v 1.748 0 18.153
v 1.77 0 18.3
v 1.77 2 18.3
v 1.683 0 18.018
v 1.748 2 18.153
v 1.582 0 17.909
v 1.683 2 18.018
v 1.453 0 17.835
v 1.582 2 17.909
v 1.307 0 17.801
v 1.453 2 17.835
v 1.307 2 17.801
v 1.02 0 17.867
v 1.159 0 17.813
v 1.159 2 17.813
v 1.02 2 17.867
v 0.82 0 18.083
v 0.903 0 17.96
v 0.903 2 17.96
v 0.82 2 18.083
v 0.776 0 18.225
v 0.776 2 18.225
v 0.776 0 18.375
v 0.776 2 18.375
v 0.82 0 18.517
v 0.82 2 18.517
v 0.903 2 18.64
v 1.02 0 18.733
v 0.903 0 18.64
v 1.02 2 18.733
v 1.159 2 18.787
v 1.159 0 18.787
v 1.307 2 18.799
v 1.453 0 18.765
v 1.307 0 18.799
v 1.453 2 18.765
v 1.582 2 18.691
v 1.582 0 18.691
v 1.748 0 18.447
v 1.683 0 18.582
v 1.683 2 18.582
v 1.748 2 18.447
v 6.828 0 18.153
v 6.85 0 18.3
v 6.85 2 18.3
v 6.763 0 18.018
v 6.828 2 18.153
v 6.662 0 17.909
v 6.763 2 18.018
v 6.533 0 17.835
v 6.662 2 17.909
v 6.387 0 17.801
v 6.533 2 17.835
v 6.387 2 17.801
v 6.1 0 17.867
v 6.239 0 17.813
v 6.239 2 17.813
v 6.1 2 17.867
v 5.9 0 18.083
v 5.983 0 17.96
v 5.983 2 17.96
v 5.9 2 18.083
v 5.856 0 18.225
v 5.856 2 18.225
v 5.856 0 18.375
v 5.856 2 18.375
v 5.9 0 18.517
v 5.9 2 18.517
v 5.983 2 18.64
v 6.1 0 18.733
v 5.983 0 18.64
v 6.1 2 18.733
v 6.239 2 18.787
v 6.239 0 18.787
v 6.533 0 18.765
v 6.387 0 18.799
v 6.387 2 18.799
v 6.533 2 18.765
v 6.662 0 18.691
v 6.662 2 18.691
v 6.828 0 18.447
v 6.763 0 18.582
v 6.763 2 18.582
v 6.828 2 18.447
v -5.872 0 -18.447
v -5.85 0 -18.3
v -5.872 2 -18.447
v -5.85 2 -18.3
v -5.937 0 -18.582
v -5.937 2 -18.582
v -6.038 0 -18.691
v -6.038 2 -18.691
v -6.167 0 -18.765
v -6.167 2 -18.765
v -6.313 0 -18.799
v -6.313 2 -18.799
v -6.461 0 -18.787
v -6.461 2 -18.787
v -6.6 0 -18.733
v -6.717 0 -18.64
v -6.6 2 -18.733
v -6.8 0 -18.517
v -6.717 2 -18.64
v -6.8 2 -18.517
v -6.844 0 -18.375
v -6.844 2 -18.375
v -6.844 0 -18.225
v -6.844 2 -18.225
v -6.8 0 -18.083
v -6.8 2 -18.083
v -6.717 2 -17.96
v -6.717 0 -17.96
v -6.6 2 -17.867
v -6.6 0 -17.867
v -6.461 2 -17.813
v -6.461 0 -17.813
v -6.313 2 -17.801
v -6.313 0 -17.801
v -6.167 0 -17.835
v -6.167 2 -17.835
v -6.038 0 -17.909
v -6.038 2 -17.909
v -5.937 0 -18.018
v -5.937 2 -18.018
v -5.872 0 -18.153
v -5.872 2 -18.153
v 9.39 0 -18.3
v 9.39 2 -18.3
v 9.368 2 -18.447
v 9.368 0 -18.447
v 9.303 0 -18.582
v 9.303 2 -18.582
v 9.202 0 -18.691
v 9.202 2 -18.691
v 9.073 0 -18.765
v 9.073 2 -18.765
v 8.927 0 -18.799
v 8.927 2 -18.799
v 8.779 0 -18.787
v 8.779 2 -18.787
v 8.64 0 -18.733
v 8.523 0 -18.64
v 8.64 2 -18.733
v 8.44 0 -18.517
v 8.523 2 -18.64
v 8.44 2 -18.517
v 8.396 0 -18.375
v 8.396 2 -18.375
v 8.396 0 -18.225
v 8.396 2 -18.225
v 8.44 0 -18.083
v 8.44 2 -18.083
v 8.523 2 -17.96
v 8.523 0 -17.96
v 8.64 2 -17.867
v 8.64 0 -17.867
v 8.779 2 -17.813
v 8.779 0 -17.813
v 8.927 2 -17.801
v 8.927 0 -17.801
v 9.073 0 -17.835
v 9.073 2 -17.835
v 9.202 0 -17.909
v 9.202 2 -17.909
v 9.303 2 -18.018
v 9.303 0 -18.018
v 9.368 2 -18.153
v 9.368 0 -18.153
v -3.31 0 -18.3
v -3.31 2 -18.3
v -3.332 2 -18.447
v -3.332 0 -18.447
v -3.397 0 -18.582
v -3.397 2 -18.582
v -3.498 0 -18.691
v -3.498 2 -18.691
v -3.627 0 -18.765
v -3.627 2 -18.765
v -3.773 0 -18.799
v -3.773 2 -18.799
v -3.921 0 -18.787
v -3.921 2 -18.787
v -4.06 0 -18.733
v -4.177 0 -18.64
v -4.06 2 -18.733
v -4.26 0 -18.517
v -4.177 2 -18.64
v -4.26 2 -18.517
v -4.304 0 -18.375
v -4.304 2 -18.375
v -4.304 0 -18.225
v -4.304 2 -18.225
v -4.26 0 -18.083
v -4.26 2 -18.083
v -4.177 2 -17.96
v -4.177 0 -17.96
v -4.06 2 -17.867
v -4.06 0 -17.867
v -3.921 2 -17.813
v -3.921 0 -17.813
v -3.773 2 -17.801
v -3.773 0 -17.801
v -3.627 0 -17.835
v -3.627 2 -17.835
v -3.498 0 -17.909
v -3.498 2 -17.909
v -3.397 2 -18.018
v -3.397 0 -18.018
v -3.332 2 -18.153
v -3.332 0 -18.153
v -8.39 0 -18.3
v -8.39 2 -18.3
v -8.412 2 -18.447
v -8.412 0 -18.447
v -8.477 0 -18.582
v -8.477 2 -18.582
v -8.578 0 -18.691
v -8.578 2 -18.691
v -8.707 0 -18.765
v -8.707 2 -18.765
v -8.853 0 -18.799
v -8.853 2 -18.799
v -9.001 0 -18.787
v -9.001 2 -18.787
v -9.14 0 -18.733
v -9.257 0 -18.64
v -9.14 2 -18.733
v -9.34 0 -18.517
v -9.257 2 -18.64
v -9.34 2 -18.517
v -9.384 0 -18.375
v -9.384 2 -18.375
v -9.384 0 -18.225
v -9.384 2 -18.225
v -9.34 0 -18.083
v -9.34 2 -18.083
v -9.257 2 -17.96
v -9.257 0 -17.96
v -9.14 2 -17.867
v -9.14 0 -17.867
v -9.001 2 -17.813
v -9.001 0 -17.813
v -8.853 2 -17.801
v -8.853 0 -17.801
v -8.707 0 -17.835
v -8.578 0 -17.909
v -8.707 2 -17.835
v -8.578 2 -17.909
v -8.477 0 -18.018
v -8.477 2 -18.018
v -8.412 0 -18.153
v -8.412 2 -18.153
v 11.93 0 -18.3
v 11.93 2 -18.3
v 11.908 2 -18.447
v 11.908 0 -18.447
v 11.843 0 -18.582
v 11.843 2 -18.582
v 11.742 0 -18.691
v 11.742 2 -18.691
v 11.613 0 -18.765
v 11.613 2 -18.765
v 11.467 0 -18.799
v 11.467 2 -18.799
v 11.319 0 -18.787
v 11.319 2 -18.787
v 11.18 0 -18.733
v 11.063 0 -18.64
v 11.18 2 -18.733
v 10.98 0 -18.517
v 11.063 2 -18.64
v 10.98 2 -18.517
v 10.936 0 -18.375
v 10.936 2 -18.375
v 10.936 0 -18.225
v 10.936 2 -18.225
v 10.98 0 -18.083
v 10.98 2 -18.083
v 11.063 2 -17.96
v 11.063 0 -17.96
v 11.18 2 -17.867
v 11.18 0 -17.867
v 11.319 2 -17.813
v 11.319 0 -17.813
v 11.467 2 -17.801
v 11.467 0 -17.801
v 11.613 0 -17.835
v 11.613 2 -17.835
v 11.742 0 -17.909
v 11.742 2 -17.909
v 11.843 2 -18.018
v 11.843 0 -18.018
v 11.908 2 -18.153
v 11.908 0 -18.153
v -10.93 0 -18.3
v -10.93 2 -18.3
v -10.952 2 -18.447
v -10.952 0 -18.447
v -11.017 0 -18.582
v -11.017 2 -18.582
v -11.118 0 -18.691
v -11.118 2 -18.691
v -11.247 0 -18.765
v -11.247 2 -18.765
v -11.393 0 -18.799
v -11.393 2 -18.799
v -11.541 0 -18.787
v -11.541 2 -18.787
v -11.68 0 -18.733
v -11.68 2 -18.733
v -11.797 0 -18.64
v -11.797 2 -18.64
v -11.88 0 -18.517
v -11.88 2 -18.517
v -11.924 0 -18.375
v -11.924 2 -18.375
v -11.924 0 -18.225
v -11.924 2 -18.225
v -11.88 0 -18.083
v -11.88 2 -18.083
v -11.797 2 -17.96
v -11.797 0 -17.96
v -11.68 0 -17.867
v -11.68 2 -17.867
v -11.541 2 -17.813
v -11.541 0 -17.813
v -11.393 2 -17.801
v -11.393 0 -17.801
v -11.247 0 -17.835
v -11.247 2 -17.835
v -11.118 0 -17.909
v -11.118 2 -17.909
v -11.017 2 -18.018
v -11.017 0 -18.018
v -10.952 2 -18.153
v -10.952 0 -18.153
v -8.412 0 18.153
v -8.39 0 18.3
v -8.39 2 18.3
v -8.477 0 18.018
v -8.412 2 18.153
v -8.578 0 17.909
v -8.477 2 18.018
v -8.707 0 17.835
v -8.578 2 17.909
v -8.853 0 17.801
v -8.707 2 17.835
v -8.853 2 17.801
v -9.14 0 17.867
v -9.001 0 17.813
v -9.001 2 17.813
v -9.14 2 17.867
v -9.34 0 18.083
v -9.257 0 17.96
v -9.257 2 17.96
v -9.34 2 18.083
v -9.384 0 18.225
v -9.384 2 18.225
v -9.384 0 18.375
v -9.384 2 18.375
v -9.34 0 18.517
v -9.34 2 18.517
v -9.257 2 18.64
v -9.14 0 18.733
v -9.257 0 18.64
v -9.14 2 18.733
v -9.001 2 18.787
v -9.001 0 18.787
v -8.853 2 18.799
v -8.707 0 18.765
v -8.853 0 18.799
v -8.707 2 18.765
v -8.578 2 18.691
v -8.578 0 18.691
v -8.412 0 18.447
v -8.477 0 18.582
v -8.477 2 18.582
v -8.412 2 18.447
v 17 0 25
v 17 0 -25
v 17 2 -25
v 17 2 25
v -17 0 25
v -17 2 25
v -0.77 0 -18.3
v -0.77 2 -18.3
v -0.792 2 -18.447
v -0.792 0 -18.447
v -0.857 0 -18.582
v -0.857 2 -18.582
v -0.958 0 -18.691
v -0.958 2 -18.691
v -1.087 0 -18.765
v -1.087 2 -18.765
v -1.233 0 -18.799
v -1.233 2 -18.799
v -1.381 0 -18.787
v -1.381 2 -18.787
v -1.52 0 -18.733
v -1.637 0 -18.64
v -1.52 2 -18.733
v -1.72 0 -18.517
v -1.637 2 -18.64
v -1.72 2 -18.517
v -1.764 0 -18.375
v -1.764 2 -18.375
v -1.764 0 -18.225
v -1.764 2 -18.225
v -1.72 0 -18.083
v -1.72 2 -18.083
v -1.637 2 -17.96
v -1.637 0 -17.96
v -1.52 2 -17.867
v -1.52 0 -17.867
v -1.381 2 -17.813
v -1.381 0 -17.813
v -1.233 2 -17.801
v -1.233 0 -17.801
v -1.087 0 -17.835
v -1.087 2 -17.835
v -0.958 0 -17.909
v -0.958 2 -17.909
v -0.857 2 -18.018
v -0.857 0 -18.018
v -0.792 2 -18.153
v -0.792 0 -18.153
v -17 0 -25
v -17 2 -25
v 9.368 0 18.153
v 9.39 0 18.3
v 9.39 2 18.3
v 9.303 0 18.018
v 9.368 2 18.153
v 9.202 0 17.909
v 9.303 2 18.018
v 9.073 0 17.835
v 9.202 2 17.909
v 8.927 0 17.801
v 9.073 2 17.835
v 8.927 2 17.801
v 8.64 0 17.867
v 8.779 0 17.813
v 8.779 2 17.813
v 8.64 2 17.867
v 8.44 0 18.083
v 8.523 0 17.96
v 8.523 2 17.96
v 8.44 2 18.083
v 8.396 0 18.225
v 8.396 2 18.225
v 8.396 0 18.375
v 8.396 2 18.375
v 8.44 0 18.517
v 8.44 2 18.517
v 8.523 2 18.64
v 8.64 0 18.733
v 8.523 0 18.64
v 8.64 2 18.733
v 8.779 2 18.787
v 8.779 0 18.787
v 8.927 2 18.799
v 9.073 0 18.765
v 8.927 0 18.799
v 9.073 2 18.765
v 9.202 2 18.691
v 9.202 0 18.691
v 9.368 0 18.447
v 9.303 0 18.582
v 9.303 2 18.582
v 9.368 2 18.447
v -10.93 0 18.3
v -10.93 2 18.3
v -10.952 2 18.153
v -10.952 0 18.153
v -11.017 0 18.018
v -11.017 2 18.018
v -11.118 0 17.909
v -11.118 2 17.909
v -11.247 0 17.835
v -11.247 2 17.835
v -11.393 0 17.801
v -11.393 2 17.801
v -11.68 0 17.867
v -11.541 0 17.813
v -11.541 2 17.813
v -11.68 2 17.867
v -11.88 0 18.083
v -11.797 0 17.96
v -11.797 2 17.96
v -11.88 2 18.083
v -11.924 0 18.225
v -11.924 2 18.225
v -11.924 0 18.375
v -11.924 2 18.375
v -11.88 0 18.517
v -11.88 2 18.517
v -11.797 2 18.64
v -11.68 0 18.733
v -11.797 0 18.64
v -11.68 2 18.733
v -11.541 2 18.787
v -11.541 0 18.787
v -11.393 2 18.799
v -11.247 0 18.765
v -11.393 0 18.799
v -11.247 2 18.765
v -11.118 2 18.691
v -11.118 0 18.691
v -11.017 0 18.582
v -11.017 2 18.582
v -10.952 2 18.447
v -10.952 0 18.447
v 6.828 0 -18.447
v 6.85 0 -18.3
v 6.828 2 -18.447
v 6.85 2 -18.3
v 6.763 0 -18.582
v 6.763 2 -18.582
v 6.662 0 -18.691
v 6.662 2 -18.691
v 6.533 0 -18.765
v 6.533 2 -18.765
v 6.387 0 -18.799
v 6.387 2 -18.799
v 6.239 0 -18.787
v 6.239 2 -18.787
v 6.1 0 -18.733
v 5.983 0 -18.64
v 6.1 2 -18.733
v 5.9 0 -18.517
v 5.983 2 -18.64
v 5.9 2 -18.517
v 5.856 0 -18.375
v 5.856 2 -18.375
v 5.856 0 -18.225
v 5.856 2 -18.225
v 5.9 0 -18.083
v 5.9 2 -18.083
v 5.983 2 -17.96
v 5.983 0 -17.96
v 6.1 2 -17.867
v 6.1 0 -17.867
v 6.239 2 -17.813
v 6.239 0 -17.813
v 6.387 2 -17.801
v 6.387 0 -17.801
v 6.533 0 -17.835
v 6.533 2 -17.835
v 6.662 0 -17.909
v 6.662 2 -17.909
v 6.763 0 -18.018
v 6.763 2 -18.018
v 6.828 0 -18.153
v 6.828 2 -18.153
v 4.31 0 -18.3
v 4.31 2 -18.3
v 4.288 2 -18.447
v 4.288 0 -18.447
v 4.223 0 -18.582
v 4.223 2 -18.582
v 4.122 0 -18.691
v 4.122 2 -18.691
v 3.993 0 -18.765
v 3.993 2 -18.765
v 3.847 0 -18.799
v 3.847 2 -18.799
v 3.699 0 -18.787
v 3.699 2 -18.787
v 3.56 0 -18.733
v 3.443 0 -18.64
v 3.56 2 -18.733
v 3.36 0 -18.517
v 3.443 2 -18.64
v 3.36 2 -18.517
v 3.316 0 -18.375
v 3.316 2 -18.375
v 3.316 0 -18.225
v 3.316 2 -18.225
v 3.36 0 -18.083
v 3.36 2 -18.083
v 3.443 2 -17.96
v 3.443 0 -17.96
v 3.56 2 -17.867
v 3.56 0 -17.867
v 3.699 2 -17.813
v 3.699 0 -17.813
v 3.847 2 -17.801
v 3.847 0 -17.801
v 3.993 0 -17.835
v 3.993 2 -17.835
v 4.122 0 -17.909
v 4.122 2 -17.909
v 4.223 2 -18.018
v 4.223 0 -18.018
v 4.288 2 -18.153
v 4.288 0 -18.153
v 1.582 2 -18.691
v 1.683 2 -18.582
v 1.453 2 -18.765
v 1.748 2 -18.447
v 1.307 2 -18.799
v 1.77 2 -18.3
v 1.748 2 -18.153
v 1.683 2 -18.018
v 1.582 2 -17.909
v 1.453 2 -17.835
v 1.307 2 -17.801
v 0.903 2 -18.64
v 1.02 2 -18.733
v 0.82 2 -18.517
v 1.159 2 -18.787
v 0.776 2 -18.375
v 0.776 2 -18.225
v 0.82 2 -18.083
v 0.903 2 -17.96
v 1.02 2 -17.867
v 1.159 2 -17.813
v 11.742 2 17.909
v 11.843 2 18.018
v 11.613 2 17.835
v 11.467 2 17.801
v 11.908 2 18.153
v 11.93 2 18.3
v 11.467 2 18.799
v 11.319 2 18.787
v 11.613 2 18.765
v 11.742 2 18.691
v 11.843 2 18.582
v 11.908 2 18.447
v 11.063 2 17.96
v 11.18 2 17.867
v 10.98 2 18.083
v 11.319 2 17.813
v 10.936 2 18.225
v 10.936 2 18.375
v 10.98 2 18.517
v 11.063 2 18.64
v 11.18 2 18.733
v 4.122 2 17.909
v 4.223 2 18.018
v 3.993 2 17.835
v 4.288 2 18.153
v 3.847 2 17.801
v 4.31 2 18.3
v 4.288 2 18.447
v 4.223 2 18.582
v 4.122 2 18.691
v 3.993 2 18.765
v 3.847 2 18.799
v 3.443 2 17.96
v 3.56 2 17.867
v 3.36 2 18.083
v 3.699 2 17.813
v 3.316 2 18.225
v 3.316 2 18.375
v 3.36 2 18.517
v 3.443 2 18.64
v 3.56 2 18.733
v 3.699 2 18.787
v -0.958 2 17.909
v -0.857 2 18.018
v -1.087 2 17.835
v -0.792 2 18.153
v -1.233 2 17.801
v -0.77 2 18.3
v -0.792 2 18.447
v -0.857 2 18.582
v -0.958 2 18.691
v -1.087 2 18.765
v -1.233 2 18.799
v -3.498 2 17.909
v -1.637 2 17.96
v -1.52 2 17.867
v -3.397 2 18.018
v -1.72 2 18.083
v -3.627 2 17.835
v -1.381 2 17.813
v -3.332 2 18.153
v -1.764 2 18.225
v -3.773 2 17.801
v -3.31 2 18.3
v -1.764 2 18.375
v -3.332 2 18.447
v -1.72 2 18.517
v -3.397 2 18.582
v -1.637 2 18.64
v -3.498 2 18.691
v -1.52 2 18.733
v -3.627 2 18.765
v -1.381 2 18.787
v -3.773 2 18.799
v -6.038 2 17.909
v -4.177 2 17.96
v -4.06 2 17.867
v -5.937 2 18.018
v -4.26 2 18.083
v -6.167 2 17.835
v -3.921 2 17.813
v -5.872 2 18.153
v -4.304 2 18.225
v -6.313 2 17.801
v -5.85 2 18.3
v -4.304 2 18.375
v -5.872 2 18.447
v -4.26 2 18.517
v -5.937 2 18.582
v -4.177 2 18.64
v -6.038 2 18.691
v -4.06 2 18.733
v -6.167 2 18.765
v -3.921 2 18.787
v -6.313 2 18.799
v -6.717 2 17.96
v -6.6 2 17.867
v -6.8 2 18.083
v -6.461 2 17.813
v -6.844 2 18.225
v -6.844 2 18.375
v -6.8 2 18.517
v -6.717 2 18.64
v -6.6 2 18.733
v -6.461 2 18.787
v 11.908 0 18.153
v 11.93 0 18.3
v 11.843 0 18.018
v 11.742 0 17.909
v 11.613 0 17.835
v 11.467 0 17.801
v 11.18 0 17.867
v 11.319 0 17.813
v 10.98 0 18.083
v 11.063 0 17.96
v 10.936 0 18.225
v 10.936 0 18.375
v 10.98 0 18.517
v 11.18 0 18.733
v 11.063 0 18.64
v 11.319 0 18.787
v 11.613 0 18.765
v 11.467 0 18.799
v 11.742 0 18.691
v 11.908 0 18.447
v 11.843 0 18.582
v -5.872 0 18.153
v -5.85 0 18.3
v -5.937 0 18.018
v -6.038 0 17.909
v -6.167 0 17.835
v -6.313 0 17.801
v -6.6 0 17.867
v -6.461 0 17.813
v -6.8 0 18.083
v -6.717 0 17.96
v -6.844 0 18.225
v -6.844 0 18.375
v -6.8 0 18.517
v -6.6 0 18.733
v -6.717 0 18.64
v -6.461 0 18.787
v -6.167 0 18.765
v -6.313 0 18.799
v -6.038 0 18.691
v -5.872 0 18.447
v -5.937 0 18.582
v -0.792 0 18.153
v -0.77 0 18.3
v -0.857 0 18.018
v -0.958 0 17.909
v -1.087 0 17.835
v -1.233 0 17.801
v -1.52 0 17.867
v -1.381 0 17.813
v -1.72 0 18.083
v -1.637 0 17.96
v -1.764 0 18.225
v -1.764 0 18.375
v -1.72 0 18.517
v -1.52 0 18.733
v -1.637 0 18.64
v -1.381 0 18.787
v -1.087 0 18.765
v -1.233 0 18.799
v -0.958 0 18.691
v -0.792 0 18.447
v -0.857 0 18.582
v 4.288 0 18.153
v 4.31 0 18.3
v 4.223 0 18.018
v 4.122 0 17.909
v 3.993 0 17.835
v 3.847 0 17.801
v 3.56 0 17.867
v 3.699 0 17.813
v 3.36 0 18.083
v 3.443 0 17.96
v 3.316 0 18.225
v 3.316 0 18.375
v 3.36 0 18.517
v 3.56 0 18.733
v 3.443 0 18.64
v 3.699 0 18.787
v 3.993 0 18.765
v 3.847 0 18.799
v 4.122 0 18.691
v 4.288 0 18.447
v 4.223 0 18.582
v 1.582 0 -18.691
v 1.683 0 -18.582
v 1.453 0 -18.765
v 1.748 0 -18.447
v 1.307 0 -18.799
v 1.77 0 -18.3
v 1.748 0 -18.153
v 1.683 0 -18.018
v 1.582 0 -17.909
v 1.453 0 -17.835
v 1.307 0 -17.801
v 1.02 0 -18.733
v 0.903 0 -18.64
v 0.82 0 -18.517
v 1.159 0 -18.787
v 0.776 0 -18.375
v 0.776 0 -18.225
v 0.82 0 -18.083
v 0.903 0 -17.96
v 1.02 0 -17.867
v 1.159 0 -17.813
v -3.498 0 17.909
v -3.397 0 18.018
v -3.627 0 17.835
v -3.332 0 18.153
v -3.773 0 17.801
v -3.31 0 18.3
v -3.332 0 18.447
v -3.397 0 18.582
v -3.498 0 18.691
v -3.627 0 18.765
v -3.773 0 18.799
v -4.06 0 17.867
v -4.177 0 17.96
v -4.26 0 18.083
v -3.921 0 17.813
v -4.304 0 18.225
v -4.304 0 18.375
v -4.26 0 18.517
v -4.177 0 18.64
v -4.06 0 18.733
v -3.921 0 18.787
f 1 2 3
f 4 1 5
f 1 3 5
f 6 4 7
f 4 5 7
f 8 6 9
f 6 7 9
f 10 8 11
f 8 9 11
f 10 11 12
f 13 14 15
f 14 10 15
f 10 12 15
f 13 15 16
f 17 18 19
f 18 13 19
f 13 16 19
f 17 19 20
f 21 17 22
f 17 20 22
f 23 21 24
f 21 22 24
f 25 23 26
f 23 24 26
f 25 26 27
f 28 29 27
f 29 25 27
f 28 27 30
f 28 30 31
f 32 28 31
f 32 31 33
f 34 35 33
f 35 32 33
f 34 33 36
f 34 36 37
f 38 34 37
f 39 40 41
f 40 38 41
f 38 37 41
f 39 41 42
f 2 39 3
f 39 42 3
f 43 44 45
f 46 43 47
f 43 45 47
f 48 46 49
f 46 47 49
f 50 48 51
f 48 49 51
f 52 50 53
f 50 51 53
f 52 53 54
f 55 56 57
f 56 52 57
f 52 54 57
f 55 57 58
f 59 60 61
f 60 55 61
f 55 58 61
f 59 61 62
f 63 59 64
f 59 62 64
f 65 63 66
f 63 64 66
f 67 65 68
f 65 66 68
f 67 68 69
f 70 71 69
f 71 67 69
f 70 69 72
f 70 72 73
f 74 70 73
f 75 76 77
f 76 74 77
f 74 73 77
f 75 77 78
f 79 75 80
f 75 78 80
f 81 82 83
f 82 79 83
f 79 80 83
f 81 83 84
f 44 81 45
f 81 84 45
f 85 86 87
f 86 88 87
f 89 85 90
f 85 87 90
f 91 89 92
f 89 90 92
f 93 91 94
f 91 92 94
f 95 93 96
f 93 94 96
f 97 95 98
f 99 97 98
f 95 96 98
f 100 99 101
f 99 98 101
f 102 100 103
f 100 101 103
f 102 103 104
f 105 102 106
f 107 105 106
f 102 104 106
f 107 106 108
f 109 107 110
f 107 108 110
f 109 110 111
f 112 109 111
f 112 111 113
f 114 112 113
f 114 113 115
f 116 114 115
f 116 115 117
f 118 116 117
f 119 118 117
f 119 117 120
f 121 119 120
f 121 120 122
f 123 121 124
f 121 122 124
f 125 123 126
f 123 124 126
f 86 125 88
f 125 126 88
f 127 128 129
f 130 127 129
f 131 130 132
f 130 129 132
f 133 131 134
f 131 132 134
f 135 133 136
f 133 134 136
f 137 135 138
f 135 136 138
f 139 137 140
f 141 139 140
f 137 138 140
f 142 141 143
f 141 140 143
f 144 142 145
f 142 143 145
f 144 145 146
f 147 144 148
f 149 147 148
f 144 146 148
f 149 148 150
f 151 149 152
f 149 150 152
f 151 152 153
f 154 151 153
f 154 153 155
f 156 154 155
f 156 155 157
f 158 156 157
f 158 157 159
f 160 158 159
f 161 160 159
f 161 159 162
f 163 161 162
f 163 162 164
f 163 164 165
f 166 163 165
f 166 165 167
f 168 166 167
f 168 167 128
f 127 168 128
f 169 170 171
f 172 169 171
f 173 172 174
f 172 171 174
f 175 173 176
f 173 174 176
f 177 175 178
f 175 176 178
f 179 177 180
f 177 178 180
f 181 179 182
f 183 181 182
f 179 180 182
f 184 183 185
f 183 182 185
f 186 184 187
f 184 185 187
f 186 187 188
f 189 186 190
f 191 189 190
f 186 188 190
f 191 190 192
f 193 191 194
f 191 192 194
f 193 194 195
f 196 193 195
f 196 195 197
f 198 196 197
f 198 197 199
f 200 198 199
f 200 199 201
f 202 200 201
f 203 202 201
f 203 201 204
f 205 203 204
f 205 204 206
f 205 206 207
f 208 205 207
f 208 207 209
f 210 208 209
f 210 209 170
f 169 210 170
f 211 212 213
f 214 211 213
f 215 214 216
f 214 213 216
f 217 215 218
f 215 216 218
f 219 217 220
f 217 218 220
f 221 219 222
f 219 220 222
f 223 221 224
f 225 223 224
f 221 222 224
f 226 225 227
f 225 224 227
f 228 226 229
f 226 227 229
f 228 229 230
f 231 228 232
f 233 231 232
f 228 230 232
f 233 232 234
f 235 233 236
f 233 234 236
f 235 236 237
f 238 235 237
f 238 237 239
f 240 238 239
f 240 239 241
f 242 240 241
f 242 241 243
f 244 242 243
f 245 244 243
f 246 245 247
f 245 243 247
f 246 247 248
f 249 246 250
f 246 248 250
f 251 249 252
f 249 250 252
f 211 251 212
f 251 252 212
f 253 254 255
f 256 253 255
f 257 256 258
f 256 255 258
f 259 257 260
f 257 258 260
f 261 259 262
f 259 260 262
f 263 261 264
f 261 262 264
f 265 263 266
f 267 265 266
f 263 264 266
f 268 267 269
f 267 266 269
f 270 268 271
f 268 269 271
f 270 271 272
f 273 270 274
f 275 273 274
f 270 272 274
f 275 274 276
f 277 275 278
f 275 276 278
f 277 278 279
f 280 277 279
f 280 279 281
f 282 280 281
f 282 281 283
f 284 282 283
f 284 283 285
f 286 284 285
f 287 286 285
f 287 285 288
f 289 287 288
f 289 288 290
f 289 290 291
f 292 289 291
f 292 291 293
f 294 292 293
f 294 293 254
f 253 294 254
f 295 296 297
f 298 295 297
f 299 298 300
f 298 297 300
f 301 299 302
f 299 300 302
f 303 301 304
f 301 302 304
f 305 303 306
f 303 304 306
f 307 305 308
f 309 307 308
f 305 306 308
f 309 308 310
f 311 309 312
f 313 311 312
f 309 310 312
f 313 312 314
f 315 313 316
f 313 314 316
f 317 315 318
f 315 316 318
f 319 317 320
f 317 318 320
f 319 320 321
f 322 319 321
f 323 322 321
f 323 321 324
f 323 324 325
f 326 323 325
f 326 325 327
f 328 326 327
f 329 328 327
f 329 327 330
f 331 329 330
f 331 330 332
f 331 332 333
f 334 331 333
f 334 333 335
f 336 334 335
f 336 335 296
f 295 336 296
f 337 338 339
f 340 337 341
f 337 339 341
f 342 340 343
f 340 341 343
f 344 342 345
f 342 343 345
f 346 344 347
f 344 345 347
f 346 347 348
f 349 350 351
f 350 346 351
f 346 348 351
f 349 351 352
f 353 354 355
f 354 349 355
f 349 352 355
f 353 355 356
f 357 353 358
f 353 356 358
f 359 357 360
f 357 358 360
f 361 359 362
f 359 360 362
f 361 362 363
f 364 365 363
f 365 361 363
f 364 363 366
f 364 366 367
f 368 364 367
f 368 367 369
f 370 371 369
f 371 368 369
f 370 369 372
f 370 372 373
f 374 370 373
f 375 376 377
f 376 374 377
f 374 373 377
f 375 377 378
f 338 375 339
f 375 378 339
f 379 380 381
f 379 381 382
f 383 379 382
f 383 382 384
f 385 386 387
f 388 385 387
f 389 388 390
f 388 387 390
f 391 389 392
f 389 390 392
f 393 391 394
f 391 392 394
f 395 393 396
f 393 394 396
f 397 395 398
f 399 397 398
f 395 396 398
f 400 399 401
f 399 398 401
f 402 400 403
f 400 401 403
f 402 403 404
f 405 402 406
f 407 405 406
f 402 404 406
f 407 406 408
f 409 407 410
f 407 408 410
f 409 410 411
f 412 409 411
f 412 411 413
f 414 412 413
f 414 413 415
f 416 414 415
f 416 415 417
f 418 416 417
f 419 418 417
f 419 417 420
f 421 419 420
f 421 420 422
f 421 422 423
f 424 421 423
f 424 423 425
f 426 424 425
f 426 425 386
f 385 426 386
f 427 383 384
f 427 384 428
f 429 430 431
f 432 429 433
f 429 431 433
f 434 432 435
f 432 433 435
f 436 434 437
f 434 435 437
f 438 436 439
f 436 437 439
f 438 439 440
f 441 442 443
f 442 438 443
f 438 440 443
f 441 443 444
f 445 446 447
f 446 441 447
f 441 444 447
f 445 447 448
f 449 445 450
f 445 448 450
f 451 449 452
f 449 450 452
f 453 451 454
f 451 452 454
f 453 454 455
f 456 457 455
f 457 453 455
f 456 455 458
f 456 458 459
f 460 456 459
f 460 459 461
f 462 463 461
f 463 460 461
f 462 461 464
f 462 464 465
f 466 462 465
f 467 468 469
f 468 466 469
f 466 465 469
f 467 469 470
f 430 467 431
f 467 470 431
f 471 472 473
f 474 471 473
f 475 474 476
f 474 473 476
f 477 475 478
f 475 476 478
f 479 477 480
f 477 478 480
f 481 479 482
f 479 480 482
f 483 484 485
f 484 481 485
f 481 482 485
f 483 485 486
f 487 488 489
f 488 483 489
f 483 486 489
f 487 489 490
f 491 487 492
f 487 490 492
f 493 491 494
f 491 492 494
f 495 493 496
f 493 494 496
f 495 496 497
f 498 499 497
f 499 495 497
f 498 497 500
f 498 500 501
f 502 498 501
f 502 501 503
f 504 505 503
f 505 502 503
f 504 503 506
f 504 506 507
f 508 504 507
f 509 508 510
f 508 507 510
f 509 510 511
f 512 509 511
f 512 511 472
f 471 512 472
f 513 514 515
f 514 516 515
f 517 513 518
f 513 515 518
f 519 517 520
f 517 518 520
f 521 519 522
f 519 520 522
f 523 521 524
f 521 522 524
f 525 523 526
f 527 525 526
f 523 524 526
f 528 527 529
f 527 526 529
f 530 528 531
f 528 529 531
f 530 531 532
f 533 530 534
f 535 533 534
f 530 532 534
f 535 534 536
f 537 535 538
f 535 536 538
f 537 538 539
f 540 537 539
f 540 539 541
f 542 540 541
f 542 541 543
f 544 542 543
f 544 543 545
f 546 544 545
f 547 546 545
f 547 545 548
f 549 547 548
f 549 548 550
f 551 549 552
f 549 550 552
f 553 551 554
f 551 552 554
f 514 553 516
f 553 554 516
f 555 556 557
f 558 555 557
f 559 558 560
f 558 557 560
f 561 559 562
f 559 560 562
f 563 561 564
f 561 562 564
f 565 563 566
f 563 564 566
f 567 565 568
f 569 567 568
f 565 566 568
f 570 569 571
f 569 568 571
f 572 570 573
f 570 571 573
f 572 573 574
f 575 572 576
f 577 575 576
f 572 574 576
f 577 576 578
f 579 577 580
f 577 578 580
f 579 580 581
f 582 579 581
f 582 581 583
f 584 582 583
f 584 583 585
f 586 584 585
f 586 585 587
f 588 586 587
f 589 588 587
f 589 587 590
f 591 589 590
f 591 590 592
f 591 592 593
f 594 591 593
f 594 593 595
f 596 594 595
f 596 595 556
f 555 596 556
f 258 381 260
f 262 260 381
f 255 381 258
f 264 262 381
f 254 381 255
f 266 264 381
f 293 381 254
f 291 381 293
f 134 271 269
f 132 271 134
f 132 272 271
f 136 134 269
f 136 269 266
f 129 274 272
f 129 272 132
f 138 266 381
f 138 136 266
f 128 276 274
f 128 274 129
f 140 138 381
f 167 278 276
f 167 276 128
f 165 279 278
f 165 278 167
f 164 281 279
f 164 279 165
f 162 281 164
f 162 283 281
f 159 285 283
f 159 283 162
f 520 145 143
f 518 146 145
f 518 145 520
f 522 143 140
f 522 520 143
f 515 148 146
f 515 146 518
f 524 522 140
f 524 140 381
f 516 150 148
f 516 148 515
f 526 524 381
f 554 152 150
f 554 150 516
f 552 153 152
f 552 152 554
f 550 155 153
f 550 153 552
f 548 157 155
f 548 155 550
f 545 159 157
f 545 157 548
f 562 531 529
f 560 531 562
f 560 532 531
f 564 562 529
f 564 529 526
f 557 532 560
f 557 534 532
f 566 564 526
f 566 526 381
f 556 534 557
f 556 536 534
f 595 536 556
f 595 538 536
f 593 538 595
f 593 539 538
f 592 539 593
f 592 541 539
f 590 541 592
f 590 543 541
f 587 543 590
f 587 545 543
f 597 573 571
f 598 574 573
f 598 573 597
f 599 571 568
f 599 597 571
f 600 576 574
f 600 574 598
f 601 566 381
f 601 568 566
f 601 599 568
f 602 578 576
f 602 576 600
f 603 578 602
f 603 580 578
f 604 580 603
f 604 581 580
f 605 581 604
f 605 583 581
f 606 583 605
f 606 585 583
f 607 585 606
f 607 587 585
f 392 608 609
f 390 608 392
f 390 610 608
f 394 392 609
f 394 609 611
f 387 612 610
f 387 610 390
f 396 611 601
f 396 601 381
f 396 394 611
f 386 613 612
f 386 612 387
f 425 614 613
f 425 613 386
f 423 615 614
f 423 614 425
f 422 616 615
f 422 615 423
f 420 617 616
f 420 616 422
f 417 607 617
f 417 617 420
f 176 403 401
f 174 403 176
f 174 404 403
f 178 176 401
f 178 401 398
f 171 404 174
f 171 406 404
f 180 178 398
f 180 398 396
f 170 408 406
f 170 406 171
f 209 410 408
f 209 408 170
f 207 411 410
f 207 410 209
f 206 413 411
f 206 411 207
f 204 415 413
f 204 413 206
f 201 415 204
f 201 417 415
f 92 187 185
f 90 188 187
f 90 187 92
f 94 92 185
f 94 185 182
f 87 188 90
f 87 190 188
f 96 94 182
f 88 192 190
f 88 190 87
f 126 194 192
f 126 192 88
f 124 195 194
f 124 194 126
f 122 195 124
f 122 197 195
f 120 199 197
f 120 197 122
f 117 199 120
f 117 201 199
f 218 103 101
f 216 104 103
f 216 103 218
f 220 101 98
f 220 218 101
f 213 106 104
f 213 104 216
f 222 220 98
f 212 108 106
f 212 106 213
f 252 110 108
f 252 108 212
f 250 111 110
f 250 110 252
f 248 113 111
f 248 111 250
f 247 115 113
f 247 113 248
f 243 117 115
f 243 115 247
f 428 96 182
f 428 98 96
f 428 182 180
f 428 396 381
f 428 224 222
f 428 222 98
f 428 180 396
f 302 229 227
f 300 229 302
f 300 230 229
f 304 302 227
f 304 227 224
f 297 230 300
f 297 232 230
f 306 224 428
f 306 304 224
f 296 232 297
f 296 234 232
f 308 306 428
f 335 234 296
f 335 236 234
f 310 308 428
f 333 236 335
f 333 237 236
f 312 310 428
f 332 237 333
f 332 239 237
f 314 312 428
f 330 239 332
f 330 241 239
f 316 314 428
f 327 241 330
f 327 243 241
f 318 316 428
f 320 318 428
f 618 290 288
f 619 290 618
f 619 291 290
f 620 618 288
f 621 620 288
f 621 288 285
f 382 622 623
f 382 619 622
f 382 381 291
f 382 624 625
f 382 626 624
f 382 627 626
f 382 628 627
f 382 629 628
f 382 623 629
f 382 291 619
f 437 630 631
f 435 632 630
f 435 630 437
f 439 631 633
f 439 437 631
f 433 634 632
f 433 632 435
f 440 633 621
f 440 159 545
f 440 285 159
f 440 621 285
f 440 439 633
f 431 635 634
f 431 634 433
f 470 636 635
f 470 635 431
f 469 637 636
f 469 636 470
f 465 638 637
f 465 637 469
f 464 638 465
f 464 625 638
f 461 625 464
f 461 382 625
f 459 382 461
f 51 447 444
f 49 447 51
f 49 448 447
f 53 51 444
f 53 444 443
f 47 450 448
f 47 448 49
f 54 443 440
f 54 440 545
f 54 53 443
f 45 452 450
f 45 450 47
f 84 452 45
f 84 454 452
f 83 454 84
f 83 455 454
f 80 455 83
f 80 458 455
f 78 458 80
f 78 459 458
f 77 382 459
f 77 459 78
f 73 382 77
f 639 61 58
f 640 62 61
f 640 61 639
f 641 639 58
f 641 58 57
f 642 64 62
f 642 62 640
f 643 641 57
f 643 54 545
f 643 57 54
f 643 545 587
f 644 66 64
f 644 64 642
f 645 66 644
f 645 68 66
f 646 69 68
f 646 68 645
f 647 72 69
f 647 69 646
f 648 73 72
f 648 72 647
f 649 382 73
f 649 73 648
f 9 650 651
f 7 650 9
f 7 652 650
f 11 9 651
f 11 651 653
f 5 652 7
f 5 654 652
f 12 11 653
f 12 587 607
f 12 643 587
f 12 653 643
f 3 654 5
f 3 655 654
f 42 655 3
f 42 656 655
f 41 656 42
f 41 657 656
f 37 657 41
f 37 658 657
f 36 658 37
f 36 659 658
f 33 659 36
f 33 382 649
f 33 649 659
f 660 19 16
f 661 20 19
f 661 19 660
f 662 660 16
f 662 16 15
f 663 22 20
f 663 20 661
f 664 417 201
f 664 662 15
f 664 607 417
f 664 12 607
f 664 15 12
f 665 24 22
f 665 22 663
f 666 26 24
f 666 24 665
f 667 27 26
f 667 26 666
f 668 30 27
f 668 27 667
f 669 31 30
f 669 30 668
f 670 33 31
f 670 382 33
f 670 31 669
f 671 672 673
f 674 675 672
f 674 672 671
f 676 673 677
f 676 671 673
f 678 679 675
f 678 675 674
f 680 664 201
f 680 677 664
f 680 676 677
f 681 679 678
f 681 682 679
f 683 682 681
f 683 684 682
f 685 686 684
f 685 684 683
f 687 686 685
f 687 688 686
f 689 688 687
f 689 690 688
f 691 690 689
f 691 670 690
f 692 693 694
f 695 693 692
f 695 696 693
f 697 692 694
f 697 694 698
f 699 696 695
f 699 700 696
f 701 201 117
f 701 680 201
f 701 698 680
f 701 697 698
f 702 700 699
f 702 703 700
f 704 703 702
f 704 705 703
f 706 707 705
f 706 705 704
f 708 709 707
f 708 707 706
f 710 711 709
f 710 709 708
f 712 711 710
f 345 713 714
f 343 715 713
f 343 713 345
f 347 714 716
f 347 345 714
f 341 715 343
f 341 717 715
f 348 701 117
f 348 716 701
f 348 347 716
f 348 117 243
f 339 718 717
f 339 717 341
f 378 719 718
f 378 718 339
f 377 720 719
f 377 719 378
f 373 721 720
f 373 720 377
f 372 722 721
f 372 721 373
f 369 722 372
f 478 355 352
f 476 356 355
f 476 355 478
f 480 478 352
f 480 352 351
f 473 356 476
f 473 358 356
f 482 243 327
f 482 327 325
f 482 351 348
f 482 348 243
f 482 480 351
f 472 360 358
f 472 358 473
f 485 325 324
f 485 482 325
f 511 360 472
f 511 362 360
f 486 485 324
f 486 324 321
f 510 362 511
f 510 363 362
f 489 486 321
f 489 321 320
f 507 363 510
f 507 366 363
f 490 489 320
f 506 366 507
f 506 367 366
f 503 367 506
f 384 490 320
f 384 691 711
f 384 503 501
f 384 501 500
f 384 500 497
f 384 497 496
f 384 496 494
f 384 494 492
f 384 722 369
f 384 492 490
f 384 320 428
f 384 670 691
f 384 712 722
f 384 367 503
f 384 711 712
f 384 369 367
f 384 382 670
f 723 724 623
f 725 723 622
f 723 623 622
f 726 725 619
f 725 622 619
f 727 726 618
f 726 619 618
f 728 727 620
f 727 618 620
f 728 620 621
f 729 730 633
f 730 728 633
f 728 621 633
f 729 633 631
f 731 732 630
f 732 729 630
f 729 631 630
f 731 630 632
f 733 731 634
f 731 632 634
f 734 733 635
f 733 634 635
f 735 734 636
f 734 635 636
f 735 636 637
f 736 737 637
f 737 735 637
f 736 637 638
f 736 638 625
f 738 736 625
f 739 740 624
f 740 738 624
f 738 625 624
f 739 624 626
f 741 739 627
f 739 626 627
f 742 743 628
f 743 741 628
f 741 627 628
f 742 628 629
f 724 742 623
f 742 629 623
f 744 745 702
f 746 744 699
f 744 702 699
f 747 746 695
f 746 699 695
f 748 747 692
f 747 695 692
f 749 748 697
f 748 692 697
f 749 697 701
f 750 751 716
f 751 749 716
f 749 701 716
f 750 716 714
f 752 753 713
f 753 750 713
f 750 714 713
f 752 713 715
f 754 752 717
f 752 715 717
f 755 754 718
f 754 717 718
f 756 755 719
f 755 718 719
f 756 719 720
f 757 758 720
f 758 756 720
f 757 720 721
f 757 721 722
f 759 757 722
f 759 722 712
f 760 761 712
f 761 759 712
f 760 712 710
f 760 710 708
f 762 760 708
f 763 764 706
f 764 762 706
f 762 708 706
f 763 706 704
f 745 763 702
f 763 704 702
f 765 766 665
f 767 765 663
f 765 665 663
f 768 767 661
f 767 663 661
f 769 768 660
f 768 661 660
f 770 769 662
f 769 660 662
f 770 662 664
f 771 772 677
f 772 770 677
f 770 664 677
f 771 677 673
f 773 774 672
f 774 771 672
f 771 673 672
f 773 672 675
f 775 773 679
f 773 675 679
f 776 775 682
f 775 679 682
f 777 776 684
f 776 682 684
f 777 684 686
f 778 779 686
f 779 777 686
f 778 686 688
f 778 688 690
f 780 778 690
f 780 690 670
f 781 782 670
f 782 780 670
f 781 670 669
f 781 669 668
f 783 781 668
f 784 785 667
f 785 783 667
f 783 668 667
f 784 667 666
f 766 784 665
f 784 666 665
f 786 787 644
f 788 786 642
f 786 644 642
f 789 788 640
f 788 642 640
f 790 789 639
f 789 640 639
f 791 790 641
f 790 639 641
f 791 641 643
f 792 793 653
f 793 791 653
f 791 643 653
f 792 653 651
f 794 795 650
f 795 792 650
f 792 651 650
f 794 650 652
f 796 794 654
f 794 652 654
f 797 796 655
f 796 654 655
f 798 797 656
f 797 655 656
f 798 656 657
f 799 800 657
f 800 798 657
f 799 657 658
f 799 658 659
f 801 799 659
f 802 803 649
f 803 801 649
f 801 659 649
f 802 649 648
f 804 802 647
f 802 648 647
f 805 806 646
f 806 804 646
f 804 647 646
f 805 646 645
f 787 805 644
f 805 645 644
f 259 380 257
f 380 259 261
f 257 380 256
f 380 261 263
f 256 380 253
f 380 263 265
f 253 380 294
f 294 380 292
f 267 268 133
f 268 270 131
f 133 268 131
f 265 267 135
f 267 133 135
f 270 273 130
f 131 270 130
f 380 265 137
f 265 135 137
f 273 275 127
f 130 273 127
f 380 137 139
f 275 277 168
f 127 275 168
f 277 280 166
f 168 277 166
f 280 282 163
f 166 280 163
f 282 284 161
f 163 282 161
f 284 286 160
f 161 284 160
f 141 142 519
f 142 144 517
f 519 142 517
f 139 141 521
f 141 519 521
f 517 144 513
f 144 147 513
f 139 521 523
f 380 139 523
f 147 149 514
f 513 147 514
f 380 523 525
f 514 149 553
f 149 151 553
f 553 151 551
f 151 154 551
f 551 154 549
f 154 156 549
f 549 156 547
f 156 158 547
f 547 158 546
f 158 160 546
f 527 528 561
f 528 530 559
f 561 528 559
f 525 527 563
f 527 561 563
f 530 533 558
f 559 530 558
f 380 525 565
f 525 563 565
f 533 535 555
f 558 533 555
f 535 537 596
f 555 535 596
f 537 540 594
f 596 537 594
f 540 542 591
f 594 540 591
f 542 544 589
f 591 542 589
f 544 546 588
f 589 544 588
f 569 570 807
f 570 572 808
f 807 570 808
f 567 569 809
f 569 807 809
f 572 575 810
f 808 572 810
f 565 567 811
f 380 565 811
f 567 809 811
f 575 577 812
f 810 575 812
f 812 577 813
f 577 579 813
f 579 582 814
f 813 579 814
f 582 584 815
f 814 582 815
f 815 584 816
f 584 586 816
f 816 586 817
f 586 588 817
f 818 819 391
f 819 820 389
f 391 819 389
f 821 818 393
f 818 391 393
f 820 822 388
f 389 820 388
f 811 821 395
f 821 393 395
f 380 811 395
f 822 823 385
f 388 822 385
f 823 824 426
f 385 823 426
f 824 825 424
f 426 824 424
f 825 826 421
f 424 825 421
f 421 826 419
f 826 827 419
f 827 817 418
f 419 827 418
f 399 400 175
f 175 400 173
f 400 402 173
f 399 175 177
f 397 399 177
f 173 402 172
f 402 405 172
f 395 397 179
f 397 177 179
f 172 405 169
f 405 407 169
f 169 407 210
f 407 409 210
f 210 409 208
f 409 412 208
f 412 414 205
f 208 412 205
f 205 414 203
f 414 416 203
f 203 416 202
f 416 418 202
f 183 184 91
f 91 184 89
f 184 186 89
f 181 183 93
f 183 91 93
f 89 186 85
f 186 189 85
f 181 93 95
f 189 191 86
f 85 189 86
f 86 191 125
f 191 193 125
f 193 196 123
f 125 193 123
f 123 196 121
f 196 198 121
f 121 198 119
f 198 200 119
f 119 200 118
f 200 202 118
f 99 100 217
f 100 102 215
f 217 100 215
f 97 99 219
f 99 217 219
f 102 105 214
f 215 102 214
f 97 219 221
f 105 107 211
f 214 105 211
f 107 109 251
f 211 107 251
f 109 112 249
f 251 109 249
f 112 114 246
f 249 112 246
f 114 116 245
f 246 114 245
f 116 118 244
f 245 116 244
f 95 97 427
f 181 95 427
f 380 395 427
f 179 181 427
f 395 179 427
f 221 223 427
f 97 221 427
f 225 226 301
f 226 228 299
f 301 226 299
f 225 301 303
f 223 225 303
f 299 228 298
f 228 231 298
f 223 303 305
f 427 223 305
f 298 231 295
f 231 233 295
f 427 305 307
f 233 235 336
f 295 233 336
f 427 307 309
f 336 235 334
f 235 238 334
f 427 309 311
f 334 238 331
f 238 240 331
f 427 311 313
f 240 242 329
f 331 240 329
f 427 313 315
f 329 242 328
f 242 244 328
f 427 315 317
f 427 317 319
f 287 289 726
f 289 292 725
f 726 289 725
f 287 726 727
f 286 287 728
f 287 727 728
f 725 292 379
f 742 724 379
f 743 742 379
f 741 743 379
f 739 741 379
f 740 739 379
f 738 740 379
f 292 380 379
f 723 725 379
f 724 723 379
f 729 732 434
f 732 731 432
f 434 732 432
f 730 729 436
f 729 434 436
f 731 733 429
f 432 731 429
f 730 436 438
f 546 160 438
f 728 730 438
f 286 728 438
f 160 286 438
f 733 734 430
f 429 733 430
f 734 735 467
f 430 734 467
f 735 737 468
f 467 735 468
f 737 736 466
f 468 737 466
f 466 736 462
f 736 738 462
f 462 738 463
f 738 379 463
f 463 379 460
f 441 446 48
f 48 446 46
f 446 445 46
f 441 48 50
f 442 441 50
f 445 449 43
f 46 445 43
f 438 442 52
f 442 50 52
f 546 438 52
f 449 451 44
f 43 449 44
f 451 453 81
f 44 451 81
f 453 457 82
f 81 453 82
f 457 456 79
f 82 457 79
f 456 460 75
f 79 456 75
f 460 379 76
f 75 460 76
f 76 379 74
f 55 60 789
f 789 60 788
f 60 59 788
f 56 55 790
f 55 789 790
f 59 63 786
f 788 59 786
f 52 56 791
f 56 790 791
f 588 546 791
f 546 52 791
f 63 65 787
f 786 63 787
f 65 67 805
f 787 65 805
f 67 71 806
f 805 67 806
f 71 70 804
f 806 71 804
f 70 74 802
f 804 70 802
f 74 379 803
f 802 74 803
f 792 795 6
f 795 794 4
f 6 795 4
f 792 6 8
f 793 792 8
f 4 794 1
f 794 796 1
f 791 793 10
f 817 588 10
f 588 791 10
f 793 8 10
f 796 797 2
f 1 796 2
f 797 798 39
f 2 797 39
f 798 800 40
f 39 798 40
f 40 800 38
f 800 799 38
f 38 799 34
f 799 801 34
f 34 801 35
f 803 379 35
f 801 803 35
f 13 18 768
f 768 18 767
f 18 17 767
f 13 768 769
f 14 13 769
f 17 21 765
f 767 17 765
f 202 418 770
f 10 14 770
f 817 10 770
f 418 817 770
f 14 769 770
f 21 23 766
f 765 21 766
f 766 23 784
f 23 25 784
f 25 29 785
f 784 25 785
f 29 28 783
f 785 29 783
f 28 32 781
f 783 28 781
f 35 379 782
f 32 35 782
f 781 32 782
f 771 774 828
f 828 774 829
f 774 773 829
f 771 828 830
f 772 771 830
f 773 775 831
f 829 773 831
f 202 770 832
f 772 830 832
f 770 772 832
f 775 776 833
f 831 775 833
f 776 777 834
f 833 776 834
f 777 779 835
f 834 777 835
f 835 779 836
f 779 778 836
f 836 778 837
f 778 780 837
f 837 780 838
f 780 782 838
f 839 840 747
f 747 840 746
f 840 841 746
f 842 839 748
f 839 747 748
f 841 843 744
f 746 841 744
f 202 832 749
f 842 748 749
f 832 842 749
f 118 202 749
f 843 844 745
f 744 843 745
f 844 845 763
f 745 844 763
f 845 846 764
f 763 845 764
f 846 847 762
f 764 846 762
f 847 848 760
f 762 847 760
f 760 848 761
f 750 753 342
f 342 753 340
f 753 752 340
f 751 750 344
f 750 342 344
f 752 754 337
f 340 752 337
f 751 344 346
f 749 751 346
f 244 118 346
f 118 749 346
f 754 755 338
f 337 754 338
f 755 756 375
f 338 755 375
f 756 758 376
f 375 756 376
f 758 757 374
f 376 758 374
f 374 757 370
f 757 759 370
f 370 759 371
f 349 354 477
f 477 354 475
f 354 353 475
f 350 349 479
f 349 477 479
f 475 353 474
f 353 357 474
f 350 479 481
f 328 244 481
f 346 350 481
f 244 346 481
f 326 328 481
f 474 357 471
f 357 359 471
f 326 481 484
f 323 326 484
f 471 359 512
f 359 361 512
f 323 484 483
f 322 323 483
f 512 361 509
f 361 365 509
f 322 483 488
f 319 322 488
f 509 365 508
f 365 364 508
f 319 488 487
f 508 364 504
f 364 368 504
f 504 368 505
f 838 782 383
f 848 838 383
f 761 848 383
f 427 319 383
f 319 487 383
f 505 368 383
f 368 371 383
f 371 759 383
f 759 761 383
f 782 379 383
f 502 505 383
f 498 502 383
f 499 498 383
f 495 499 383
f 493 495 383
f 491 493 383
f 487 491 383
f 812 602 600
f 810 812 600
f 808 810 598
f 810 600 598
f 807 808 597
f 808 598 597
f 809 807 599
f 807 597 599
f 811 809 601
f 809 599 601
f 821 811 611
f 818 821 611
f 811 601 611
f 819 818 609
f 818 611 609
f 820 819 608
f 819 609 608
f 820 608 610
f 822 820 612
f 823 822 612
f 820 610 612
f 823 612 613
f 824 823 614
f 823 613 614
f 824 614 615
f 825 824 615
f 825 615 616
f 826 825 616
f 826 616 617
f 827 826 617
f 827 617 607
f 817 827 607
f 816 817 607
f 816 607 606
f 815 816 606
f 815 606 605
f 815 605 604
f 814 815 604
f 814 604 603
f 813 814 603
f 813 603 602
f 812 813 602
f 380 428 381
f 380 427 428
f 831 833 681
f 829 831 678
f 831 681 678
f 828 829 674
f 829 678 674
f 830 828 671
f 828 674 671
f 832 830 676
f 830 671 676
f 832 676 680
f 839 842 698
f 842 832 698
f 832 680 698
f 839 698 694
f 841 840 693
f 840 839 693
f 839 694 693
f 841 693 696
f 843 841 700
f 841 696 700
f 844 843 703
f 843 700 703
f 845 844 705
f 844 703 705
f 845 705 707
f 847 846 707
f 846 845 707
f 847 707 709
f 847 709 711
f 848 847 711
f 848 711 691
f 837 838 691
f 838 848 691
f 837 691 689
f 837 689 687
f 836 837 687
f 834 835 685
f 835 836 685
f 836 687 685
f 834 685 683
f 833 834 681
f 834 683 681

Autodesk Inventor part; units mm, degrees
ref_plane "YZ Plane" through (0, 0, 0) normal (1, 0, 0) x (0, 1, 0)
ref_plane "XZ Plane" through (0, 0, 0) normal (0, 1, 0) x (-1, 0, 0)
sketch "Sketch1" plane through (0, 0, 0) normal (0, 1, 0) x (-1, 0, 0)
  line L0 (-17, 25) -> (17, 25)
  line L1 (17, 25) -> (17, -25)
  line L2 (17, -25) -> (-17, -25)
  line L3 (-17, -25) -> (-17, 25)
  line L4 (-17, 25) -> (17, -25) construction
  line L5 (17, 25) -> (-17, -25) construction
  point P0 (0, 0)
  dimension "d0" = 34
  dimension "d1" = 50
extrude "Extrusion1" add sketch "Sketch1" along normal blind 2
sketch "Sketch2" plane through (0, 2, 0) normal (0, 1, 0) x (1, 0, 0)
  line L0 (17, 25) -> (-17, 25) projected
  line L1 (0, 25) -> (0, 18.3)
  line L2 (0, 18.3) -> (-1.27, 18.3)
  line L3 (-1.27, 18.3) -> (-3.81, 18.3)
  line L4 (-3.81, 18.3) -> (-6.35, 18.3)
  line L5 (-6.35, 18.3) -> (-8.89, 18.3)
  line L6 (-8.89, 18.3) -> (-11.43, 18.3)
  line L7 (0, 18.3) -> (1.27, 18.3)
  line L8 (1.27, 18.3) -> (3.81, 18.3)
  line L9 (3.81, 18.3) -> (6.35, 18.3)
  line L10 (6.35, 18.3) -> (8.89, 18.3)
  line L11 (8.89, 18.3) -> (11.43, 18.3)
  circle A0 centre (-11.43, 18.3) radius 0.5
  circle A1 centre (-8.89, 18.3) radius 0.5
  circle A2 centre (-6.35, 18.3) radius 0.5
  circle A3 centre (-3.81, 18.3) radius 0.5
  circle A4 centre (-1.27, 18.3) radius 0.5
  circle A5 centre (1.27, 18.3) radius 0.5
  circle A6 centre (3.81, 18.3) radius 0.5
  circle A7 centre (6.35, 18.3) radius 0.5
  circle A8 centre (8.89, 18.3) radius 0.5
  circle A9 centre (11.43, 18.3) radius 0.5
  point P0 (0, 0)
  dimension "d4" = 6.7
  dimension "d5" = 1.27
  dimension "d6" = 2.54
  dimension "d7" = 2.54
  dimension "d8" = 2.54
  dimension "d9" = 2.54
  dimension "d10" = 1.27
  dimension "d11" = 2.54
  dimension "d12" = 2.54
  dimension "d13" = 2.54
  dimension "d14" = 2.54
  dimension "d15" = 1
  dimension "d16" = 1
  dimension "d17" = 1
  dimension "d18" = 1
  dimension "d19" = 1
  dimension "d20" = 1
  dimension "d21" = 1
  dimension "d22" = 1
  dimension "d23" = 1
  dimension "d24" = 1
extrude "Extrusion2" cut sketch "Sketch2" against normal up to next
ref_plane "Work Plane1" through (-17, 2, 0) normal (0, 0, 1) x (1, 0, 0)
mirror "Mirror1" about plane through (-17, 2, 0) normal (0, 0, 1) of "Extrusion2"
properties part number "pcb"
